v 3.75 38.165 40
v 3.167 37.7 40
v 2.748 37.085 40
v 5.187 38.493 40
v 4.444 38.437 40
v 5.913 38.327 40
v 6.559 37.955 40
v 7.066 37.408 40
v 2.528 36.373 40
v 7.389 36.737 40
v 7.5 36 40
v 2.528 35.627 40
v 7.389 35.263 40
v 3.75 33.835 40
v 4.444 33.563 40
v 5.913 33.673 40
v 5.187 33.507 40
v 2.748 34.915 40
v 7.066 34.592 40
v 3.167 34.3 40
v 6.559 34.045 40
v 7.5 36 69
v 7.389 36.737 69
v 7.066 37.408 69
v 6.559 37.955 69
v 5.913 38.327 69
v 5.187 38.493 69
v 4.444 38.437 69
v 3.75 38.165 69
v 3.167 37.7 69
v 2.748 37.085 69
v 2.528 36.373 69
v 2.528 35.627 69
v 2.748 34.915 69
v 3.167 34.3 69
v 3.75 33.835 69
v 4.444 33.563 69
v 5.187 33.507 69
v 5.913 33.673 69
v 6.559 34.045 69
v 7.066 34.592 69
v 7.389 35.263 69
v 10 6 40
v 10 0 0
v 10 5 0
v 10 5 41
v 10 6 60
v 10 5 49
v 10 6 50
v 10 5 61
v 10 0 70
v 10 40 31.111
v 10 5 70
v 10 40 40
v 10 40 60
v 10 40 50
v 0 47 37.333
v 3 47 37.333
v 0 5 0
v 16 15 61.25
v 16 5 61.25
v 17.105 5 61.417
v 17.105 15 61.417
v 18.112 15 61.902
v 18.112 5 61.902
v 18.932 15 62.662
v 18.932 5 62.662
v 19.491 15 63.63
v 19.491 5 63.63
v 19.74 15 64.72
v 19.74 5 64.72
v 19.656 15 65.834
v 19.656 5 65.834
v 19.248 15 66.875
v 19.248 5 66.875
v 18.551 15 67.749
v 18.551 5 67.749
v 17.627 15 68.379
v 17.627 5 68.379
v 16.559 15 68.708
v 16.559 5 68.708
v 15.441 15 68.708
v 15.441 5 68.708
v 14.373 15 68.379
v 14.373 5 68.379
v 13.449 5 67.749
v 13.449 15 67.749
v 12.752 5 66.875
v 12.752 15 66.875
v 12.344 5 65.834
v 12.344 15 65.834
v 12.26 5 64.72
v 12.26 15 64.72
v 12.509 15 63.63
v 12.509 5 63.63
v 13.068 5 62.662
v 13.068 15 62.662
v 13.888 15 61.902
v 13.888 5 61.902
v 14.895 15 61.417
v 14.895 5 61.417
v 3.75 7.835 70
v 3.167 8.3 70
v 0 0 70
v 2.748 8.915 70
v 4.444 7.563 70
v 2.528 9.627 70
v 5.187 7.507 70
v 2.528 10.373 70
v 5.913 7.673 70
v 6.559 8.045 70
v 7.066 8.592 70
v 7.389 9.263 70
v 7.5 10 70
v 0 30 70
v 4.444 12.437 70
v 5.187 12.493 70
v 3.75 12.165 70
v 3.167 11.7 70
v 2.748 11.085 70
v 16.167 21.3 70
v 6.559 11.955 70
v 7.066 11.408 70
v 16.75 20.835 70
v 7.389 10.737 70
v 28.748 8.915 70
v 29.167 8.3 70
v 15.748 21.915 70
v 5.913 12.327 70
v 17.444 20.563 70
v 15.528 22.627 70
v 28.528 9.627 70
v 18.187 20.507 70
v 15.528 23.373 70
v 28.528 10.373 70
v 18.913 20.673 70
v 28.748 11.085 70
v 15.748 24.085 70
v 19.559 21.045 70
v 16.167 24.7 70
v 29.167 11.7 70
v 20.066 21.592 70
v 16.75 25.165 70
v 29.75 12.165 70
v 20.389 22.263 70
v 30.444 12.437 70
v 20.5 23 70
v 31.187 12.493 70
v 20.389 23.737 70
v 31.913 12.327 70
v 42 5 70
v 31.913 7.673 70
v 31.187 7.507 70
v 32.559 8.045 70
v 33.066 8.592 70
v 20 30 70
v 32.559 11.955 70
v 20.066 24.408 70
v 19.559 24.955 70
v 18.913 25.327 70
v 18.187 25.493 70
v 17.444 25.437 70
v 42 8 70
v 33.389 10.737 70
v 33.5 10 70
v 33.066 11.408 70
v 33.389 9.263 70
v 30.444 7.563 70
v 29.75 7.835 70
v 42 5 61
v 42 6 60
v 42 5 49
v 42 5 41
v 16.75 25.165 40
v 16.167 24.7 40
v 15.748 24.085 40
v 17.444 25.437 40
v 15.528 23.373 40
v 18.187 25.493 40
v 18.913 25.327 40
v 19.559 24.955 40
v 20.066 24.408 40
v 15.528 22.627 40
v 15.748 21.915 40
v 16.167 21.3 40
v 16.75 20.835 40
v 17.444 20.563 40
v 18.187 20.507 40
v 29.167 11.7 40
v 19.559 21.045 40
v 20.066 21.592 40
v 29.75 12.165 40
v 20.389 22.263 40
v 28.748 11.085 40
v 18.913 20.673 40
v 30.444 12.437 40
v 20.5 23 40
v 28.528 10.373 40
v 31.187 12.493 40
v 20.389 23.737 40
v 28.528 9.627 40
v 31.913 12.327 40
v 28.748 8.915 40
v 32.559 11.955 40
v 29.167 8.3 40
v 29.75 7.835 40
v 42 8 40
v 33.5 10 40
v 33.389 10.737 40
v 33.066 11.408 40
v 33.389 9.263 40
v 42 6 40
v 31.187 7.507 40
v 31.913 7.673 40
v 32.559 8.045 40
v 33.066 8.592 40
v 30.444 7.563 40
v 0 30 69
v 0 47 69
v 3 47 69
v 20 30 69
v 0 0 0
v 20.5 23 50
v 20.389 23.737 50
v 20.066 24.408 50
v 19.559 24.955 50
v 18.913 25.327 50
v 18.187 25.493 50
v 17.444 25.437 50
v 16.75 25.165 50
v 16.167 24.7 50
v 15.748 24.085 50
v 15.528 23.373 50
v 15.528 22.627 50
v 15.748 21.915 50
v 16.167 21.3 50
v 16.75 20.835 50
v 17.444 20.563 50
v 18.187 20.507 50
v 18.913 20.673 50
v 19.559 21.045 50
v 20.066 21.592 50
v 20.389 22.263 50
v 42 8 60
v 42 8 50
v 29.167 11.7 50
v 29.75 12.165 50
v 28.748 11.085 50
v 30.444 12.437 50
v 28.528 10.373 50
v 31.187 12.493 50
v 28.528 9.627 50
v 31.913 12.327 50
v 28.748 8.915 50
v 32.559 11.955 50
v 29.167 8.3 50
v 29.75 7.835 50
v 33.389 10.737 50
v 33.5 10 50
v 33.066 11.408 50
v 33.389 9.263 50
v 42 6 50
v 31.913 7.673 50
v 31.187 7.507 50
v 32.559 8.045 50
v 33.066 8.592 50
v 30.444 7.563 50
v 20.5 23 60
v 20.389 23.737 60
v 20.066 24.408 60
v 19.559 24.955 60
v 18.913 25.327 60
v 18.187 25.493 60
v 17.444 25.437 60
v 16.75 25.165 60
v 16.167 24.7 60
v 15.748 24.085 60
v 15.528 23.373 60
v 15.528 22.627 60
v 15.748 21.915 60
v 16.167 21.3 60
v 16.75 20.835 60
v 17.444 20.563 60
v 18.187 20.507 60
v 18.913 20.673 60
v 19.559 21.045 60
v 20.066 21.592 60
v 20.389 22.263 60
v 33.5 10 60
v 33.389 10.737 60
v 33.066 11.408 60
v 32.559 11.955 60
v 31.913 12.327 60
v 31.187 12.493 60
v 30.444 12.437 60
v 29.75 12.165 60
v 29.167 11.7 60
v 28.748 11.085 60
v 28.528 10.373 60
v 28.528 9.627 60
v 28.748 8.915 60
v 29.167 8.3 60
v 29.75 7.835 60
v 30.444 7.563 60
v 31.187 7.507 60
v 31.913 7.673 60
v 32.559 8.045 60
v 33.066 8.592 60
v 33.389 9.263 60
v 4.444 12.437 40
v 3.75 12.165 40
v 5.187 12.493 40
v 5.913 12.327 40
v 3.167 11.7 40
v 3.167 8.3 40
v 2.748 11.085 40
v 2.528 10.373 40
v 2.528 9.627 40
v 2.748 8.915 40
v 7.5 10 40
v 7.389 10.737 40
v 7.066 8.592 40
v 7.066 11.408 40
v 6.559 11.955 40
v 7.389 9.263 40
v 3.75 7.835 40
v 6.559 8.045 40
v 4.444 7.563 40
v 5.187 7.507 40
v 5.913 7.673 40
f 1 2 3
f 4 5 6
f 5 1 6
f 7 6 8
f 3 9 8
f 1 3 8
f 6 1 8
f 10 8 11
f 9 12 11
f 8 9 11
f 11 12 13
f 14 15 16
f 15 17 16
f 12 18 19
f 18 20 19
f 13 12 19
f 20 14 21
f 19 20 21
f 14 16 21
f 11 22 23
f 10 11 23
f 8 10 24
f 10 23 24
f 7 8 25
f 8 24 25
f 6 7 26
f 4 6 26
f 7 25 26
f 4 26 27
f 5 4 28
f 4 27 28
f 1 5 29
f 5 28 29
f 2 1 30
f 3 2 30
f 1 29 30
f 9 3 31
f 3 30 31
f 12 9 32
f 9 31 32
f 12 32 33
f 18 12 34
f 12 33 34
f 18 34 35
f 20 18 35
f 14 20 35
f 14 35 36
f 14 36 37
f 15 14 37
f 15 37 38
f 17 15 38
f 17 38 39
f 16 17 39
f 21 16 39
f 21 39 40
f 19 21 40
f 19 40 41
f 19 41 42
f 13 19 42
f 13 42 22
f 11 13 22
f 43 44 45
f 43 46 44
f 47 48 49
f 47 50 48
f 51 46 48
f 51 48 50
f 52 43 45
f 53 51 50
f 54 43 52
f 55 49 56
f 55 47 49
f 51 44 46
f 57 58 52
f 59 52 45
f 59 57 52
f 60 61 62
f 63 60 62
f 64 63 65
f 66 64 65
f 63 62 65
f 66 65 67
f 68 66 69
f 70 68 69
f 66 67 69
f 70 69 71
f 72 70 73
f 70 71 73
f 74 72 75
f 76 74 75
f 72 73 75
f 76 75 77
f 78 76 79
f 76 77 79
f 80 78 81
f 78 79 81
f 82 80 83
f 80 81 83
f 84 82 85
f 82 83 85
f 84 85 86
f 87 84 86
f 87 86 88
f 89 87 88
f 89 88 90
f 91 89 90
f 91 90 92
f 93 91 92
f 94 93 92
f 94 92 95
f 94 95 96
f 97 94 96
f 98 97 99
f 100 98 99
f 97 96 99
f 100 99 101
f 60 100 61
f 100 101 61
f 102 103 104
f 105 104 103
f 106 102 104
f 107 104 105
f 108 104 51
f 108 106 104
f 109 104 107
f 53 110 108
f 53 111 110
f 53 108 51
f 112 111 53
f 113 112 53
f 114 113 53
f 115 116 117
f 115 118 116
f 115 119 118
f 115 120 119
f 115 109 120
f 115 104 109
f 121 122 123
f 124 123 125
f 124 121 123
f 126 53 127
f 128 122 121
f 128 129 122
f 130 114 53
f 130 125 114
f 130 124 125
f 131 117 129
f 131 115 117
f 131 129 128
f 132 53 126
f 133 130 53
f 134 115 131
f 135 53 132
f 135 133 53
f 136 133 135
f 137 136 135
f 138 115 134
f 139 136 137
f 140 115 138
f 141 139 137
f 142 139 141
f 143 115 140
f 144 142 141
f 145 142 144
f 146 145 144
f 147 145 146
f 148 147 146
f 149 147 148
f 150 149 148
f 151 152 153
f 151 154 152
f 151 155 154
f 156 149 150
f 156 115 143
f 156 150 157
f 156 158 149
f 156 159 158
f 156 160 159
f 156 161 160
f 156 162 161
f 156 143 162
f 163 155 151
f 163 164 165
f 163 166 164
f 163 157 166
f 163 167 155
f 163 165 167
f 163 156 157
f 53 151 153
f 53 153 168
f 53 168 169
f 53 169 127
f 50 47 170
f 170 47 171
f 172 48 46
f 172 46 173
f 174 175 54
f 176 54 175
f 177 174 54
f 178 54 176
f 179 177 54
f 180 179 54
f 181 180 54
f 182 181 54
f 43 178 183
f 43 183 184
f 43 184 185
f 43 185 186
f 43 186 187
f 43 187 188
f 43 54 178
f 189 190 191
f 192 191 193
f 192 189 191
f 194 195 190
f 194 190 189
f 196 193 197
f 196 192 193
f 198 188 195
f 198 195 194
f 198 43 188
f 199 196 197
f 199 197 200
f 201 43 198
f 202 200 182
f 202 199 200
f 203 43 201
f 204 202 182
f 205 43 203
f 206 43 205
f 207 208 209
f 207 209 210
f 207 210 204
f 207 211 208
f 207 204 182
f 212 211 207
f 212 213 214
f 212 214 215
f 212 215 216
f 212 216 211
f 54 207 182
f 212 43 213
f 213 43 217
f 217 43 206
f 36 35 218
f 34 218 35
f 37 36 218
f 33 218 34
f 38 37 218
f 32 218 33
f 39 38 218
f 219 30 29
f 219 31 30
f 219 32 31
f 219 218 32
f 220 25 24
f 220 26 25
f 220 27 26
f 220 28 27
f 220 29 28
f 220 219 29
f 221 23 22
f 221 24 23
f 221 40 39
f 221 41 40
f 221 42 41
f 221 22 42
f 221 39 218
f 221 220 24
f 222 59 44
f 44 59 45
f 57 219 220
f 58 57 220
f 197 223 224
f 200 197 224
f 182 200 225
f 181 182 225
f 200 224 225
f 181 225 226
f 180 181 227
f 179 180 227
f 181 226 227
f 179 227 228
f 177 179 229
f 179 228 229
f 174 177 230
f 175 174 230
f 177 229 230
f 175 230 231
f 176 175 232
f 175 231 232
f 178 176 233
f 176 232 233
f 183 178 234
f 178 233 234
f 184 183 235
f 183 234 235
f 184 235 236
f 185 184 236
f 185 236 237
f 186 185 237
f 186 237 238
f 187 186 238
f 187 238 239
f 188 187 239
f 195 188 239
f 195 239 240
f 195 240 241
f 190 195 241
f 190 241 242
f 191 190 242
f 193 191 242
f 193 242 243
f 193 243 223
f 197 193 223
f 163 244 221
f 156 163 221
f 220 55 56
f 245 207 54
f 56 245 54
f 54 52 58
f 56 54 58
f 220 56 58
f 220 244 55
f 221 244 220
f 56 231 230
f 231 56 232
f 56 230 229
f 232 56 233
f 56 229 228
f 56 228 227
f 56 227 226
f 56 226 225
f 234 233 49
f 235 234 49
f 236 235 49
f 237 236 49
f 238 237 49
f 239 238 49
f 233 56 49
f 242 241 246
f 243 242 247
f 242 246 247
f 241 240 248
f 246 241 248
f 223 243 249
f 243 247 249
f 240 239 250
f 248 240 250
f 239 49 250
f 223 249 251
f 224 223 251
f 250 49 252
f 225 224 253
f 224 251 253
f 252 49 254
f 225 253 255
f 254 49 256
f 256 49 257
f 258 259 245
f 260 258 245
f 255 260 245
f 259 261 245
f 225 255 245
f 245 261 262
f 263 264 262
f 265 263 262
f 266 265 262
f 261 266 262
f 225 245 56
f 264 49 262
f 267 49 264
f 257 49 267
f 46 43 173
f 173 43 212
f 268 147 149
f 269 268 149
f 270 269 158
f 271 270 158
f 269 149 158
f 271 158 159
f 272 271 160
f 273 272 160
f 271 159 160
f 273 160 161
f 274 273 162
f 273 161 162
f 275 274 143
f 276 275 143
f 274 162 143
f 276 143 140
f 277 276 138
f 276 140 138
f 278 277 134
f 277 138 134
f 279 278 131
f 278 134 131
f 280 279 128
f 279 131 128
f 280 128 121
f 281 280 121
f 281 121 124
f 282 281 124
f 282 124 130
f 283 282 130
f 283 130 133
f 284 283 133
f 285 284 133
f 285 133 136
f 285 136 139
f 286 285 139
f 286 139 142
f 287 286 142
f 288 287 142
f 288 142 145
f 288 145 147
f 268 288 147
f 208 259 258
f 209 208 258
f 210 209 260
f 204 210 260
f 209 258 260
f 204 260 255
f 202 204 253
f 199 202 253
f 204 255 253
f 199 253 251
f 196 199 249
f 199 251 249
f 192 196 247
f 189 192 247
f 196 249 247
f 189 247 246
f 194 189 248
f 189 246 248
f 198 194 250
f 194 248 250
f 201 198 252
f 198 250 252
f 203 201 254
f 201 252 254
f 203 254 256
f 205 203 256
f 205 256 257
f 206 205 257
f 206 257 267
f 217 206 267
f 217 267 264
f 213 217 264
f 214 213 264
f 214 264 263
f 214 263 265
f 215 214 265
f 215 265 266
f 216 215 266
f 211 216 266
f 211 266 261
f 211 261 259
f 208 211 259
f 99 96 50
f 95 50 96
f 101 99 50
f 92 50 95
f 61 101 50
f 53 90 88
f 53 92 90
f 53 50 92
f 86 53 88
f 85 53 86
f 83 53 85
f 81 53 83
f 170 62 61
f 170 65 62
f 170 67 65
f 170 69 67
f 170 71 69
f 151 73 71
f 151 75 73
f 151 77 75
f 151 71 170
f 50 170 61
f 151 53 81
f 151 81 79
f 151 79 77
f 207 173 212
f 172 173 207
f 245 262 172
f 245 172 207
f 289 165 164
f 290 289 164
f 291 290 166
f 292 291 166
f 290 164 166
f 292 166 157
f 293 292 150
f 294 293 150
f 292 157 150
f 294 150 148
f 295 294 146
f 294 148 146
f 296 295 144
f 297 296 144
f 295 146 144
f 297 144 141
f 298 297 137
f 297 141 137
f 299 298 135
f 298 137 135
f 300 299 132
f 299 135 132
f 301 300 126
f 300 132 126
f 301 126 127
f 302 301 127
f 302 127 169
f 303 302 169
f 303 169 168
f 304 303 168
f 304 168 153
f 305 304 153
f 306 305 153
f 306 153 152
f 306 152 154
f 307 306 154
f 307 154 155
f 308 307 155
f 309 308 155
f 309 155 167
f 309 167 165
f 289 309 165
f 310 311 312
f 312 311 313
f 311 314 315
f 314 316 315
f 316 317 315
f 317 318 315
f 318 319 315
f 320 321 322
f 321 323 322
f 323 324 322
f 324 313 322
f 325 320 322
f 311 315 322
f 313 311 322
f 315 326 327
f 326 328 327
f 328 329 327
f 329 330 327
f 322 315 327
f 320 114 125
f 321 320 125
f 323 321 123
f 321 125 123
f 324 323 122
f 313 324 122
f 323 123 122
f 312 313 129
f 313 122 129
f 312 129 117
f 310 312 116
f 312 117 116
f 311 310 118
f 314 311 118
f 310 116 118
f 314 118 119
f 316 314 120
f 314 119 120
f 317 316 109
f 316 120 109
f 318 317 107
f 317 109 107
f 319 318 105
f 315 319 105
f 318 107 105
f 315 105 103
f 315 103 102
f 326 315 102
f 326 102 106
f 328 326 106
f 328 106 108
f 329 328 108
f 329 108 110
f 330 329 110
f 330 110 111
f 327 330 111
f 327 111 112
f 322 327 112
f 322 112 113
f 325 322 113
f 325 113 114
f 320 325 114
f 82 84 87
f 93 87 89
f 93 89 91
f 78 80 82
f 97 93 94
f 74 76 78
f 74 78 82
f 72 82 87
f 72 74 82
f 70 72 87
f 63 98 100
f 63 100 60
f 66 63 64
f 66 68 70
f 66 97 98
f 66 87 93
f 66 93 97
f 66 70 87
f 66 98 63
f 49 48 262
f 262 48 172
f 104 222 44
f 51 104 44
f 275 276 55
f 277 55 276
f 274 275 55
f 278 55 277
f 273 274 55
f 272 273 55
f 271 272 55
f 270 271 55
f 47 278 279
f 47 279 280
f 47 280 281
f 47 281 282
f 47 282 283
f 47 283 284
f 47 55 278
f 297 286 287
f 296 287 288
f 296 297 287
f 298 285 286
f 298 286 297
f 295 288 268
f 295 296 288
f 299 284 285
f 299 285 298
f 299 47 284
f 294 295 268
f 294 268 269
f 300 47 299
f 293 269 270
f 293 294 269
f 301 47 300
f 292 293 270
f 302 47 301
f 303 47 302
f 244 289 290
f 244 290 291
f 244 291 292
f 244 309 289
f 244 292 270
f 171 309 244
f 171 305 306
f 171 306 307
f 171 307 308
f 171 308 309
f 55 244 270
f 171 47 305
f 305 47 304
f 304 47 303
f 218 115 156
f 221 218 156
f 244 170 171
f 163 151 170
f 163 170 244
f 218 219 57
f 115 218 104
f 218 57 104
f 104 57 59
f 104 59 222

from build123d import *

# Parameters (mm, degrees)
EXTRUDE_1_DEPTH          = 70
CUT_EXTRUDE_1_DEPTH      = 100.498743711
SKETCH_4_W               = 45.819685342
SKETCH_4_H               = 5
CUT_EXTRUDE_2_DEPTH      = 96.72878355
SKETCH_5_W               = 32
SKETCH_5_H               = 10
SKETCH_5_H_2             = 40
CUT_EXTRUDE_3_DEPTH      = 94.214805691
CUT_EXTRUDE_4_DEPTH      = 1
SKETCH_7_R               = 3.75
CUT_EXTRUDE_5_DEPTH      = 10
CUT_EXTRUDE_6_REACH      = 97.729
SKETCH_8_R               = 2.5
CUT_EXTRUDE_7_DEPTH      = 92.782351245
CUT_EXTRUDE_7_DEPTH_BACK = 92.782351245
CUT_EXTRUDE_8_DEPTH      = 96
CHAMFER_1_SIZE           = 1


with BuildPart() as part:
    # 草图1 → 拉伸1 (new body)
    with BuildSketch(Plane.XY):
        Polygon((0, 0), (50, 0), (0, 50), align=None)
    extrude(amount=EXTRUDE_1_DEPTH)

    # 草图3 → 切除-拉伸1 (cut, through all)
    with BuildSketch(Plane.XY.offset(70)):
        Polygon((50, 0), (42, 0), (42, 8), align=None)
    extrude(amount=-CUT_EXTRUDE_1_DEPTH, mode=Mode.SUBTRACT)

    # 草图4 → 切除-拉伸2 (cut, through all)
    with BuildSketch(Plane.XY.offset(70)):
        with Locations((32.909842671, 2.5)):
            Rectangle(SKETCH_4_W, SKETCH_4_H)
    extrude(amount=-CUT_EXTRUDE_2_DEPTH, mode=Mode.SUBTRACT)

    # 草图5 → 切除-拉伸3 (cut, through all)
    with BuildSketch(Plane.XZ.offset(-5)):
        with Locations((26, 55)):
            Rectangle(SKETCH_5_W, SKETCH_5_H)
        with Locations((26, 20)):
            Rectangle(SKETCH_5_W, SKETCH_5_H_2)
    extrude(amount=-CUT_EXTRUDE_3_DEPTH, mode=Mode.SUBTRACT)

    # 草图6 → 切除-拉伸4 (cut)
    with BuildSketch(Plane.XY.offset(70)):
        Polygon((0, 50), (0, 30), (20, 30), align=None)
    extrude(amount=-CUT_EXTRUDE_4_DEPTH, mode=Mode.SUBTRACT)

    # 草图7 → 切除-拉伸5 (cut)
    with BuildSketch(Plane.XZ.offset(-5)):
        with Locations(Location((16, 65, 0), (0, 0, 270))):
            Circle(SKETCH_7_R)
    extrude(amount=-CUT_EXTRUDE_5_DEPTH, mode=Mode.SUBTRACT)

    # 切除-拉伸6: up to this face of the body (flat: up to its plane)
    cut_extrude_6_end = Plane(part.part.faces().sort_by_distance((21.50877193, 16.745614035, 40))[0])
    # 草图8 → 切除-拉伸6 (cut, up to the picked face)
    with BuildSketch(Plane.XY.offset(70), mode=Mode.PRIVATE) as cut_extrude_6_sk1:
        with Locations((5, 36)):
            Circle(SKETCH_8_R)
    cut_extrude_6_tool1 = split(extrude(cut_extrude_6_sk1.sketch, amount=-CUT_EXTRUDE_6_REACH, mode=Mode.PRIVATE), bisect_by=cut_extrude_6_end, keep=Keep.BOTH, mode=Mode.PRIVATE)
    # 草图8 → 切除-拉伸6 (cut, up to the picked face)
    with BuildSketch(Plane.XY.offset(70), mode=Mode.PRIVATE) as cut_extrude_6_sk2:
        with Locations((5, 10)):
            Circle(SKETCH_8_R)
    cut_extrude_6_tool2 = split(extrude(cut_extrude_6_sk2.sketch, amount=-CUT_EXTRUDE_6_REACH, mode=Mode.PRIVATE), bisect_by=cut_extrude_6_end, keep=Keep.BOTH, mode=Mode.PRIVATE)
    # 草图8 → 切除-拉伸6 (cut, up to the picked face)
    with BuildSketch(Plane.XY.offset(70), mode=Mode.PRIVATE) as cut_extrude_6_sk3:
        with Locations((31, 10)):
            Circle(SKETCH_8_R)
    cut_extrude_6_tool3 = split(extrude(cut_extrude_6_sk3.sketch, amount=-CUT_EXTRUDE_6_REACH, mode=Mode.PRIVATE), bisect_by=cut_extrude_6_end, keep=Keep.BOTH, mode=Mode.PRIVATE)
    # 草图8 → 切除-拉伸6 (cut, up to the picked face)
    with BuildSketch(Plane.XY.offset(70), mode=Mode.PRIVATE) as cut_extrude_6_sk4:
        with Locations((18, 23)):
            Circle(SKETCH_8_R)
    cut_extrude_6_tool4 = split(extrude(cut_extrude_6_sk4.sketch, amount=-CUT_EXTRUDE_6_REACH, mode=Mode.PRIVATE), bisect_by=cut_extrude_6_end, keep=Keep.BOTH, mode=Mode.PRIVATE)
    add(cut_extrude_6_tool1.solids().sort_by(Axis((5, 36, 70), (0, 0, -1)))[0], mode=Mode.SUBTRACT)
    add(cut_extrude_6_tool2.solids().sort_by(Axis((5, 10, 70), (0, 0, -1)))[0], mode=Mode.SUBTRACT)
    add(cut_extrude_6_tool3.solids().sort_by(Axis((31, 10, 70), (0, 0, -1)))[0], mode=Mode.SUBTRACT)
    add(cut_extrude_6_tool4.solids().sort_by(Axis((18, 23, 70), (0, 0, -1)))[0], mode=Mode.SUBTRACT)

    # 草图9 → 切除-拉伸7 (cut, two sides: drawn at the far end of the back side and taken through both)
    with BuildSketch(Plane(origin=(10, 0, 0), x_dir=(0, 0, -1), z_dir=(1, 0, 0)).offset(-CUT_EXTRUDE_7_DEPTH_BACK)):
        Polygon((182.046505341, 50), (0, 50), (-40, 50), (0, 5), (120.945115134, -131.063254526), (465.924736836, -247.479666759), (527.026127043, -66.416412233), align=None)
    extrude(amount=CUT_EXTRUDE_7_DEPTH + CUT_EXTRUDE_7_DEPTH_BACK, mode=Mode.SUBTRACT)

    # 草图10 → 切除-拉伸8 (cut, through all)
    with BuildSketch(Plane.XY.offset(69)):
        Polygon((0, 50), (0, 47), (3, 47), align=None)
    extrude(amount=-CUT_EXTRUDE_8_DEPTH, mode=Mode.SUBTRACT)

    # 倒角1
    chamfer_1_edges = [part.edges().sort_by_distance(p)[0] for p in [
        (26, 5, 60),
        (26, 5, 50),
        (26, 5, 40),
    ]]
    chamfer(chamfer_1_edges, length=CHAMFER_1_SIZE)


solid = part.part
